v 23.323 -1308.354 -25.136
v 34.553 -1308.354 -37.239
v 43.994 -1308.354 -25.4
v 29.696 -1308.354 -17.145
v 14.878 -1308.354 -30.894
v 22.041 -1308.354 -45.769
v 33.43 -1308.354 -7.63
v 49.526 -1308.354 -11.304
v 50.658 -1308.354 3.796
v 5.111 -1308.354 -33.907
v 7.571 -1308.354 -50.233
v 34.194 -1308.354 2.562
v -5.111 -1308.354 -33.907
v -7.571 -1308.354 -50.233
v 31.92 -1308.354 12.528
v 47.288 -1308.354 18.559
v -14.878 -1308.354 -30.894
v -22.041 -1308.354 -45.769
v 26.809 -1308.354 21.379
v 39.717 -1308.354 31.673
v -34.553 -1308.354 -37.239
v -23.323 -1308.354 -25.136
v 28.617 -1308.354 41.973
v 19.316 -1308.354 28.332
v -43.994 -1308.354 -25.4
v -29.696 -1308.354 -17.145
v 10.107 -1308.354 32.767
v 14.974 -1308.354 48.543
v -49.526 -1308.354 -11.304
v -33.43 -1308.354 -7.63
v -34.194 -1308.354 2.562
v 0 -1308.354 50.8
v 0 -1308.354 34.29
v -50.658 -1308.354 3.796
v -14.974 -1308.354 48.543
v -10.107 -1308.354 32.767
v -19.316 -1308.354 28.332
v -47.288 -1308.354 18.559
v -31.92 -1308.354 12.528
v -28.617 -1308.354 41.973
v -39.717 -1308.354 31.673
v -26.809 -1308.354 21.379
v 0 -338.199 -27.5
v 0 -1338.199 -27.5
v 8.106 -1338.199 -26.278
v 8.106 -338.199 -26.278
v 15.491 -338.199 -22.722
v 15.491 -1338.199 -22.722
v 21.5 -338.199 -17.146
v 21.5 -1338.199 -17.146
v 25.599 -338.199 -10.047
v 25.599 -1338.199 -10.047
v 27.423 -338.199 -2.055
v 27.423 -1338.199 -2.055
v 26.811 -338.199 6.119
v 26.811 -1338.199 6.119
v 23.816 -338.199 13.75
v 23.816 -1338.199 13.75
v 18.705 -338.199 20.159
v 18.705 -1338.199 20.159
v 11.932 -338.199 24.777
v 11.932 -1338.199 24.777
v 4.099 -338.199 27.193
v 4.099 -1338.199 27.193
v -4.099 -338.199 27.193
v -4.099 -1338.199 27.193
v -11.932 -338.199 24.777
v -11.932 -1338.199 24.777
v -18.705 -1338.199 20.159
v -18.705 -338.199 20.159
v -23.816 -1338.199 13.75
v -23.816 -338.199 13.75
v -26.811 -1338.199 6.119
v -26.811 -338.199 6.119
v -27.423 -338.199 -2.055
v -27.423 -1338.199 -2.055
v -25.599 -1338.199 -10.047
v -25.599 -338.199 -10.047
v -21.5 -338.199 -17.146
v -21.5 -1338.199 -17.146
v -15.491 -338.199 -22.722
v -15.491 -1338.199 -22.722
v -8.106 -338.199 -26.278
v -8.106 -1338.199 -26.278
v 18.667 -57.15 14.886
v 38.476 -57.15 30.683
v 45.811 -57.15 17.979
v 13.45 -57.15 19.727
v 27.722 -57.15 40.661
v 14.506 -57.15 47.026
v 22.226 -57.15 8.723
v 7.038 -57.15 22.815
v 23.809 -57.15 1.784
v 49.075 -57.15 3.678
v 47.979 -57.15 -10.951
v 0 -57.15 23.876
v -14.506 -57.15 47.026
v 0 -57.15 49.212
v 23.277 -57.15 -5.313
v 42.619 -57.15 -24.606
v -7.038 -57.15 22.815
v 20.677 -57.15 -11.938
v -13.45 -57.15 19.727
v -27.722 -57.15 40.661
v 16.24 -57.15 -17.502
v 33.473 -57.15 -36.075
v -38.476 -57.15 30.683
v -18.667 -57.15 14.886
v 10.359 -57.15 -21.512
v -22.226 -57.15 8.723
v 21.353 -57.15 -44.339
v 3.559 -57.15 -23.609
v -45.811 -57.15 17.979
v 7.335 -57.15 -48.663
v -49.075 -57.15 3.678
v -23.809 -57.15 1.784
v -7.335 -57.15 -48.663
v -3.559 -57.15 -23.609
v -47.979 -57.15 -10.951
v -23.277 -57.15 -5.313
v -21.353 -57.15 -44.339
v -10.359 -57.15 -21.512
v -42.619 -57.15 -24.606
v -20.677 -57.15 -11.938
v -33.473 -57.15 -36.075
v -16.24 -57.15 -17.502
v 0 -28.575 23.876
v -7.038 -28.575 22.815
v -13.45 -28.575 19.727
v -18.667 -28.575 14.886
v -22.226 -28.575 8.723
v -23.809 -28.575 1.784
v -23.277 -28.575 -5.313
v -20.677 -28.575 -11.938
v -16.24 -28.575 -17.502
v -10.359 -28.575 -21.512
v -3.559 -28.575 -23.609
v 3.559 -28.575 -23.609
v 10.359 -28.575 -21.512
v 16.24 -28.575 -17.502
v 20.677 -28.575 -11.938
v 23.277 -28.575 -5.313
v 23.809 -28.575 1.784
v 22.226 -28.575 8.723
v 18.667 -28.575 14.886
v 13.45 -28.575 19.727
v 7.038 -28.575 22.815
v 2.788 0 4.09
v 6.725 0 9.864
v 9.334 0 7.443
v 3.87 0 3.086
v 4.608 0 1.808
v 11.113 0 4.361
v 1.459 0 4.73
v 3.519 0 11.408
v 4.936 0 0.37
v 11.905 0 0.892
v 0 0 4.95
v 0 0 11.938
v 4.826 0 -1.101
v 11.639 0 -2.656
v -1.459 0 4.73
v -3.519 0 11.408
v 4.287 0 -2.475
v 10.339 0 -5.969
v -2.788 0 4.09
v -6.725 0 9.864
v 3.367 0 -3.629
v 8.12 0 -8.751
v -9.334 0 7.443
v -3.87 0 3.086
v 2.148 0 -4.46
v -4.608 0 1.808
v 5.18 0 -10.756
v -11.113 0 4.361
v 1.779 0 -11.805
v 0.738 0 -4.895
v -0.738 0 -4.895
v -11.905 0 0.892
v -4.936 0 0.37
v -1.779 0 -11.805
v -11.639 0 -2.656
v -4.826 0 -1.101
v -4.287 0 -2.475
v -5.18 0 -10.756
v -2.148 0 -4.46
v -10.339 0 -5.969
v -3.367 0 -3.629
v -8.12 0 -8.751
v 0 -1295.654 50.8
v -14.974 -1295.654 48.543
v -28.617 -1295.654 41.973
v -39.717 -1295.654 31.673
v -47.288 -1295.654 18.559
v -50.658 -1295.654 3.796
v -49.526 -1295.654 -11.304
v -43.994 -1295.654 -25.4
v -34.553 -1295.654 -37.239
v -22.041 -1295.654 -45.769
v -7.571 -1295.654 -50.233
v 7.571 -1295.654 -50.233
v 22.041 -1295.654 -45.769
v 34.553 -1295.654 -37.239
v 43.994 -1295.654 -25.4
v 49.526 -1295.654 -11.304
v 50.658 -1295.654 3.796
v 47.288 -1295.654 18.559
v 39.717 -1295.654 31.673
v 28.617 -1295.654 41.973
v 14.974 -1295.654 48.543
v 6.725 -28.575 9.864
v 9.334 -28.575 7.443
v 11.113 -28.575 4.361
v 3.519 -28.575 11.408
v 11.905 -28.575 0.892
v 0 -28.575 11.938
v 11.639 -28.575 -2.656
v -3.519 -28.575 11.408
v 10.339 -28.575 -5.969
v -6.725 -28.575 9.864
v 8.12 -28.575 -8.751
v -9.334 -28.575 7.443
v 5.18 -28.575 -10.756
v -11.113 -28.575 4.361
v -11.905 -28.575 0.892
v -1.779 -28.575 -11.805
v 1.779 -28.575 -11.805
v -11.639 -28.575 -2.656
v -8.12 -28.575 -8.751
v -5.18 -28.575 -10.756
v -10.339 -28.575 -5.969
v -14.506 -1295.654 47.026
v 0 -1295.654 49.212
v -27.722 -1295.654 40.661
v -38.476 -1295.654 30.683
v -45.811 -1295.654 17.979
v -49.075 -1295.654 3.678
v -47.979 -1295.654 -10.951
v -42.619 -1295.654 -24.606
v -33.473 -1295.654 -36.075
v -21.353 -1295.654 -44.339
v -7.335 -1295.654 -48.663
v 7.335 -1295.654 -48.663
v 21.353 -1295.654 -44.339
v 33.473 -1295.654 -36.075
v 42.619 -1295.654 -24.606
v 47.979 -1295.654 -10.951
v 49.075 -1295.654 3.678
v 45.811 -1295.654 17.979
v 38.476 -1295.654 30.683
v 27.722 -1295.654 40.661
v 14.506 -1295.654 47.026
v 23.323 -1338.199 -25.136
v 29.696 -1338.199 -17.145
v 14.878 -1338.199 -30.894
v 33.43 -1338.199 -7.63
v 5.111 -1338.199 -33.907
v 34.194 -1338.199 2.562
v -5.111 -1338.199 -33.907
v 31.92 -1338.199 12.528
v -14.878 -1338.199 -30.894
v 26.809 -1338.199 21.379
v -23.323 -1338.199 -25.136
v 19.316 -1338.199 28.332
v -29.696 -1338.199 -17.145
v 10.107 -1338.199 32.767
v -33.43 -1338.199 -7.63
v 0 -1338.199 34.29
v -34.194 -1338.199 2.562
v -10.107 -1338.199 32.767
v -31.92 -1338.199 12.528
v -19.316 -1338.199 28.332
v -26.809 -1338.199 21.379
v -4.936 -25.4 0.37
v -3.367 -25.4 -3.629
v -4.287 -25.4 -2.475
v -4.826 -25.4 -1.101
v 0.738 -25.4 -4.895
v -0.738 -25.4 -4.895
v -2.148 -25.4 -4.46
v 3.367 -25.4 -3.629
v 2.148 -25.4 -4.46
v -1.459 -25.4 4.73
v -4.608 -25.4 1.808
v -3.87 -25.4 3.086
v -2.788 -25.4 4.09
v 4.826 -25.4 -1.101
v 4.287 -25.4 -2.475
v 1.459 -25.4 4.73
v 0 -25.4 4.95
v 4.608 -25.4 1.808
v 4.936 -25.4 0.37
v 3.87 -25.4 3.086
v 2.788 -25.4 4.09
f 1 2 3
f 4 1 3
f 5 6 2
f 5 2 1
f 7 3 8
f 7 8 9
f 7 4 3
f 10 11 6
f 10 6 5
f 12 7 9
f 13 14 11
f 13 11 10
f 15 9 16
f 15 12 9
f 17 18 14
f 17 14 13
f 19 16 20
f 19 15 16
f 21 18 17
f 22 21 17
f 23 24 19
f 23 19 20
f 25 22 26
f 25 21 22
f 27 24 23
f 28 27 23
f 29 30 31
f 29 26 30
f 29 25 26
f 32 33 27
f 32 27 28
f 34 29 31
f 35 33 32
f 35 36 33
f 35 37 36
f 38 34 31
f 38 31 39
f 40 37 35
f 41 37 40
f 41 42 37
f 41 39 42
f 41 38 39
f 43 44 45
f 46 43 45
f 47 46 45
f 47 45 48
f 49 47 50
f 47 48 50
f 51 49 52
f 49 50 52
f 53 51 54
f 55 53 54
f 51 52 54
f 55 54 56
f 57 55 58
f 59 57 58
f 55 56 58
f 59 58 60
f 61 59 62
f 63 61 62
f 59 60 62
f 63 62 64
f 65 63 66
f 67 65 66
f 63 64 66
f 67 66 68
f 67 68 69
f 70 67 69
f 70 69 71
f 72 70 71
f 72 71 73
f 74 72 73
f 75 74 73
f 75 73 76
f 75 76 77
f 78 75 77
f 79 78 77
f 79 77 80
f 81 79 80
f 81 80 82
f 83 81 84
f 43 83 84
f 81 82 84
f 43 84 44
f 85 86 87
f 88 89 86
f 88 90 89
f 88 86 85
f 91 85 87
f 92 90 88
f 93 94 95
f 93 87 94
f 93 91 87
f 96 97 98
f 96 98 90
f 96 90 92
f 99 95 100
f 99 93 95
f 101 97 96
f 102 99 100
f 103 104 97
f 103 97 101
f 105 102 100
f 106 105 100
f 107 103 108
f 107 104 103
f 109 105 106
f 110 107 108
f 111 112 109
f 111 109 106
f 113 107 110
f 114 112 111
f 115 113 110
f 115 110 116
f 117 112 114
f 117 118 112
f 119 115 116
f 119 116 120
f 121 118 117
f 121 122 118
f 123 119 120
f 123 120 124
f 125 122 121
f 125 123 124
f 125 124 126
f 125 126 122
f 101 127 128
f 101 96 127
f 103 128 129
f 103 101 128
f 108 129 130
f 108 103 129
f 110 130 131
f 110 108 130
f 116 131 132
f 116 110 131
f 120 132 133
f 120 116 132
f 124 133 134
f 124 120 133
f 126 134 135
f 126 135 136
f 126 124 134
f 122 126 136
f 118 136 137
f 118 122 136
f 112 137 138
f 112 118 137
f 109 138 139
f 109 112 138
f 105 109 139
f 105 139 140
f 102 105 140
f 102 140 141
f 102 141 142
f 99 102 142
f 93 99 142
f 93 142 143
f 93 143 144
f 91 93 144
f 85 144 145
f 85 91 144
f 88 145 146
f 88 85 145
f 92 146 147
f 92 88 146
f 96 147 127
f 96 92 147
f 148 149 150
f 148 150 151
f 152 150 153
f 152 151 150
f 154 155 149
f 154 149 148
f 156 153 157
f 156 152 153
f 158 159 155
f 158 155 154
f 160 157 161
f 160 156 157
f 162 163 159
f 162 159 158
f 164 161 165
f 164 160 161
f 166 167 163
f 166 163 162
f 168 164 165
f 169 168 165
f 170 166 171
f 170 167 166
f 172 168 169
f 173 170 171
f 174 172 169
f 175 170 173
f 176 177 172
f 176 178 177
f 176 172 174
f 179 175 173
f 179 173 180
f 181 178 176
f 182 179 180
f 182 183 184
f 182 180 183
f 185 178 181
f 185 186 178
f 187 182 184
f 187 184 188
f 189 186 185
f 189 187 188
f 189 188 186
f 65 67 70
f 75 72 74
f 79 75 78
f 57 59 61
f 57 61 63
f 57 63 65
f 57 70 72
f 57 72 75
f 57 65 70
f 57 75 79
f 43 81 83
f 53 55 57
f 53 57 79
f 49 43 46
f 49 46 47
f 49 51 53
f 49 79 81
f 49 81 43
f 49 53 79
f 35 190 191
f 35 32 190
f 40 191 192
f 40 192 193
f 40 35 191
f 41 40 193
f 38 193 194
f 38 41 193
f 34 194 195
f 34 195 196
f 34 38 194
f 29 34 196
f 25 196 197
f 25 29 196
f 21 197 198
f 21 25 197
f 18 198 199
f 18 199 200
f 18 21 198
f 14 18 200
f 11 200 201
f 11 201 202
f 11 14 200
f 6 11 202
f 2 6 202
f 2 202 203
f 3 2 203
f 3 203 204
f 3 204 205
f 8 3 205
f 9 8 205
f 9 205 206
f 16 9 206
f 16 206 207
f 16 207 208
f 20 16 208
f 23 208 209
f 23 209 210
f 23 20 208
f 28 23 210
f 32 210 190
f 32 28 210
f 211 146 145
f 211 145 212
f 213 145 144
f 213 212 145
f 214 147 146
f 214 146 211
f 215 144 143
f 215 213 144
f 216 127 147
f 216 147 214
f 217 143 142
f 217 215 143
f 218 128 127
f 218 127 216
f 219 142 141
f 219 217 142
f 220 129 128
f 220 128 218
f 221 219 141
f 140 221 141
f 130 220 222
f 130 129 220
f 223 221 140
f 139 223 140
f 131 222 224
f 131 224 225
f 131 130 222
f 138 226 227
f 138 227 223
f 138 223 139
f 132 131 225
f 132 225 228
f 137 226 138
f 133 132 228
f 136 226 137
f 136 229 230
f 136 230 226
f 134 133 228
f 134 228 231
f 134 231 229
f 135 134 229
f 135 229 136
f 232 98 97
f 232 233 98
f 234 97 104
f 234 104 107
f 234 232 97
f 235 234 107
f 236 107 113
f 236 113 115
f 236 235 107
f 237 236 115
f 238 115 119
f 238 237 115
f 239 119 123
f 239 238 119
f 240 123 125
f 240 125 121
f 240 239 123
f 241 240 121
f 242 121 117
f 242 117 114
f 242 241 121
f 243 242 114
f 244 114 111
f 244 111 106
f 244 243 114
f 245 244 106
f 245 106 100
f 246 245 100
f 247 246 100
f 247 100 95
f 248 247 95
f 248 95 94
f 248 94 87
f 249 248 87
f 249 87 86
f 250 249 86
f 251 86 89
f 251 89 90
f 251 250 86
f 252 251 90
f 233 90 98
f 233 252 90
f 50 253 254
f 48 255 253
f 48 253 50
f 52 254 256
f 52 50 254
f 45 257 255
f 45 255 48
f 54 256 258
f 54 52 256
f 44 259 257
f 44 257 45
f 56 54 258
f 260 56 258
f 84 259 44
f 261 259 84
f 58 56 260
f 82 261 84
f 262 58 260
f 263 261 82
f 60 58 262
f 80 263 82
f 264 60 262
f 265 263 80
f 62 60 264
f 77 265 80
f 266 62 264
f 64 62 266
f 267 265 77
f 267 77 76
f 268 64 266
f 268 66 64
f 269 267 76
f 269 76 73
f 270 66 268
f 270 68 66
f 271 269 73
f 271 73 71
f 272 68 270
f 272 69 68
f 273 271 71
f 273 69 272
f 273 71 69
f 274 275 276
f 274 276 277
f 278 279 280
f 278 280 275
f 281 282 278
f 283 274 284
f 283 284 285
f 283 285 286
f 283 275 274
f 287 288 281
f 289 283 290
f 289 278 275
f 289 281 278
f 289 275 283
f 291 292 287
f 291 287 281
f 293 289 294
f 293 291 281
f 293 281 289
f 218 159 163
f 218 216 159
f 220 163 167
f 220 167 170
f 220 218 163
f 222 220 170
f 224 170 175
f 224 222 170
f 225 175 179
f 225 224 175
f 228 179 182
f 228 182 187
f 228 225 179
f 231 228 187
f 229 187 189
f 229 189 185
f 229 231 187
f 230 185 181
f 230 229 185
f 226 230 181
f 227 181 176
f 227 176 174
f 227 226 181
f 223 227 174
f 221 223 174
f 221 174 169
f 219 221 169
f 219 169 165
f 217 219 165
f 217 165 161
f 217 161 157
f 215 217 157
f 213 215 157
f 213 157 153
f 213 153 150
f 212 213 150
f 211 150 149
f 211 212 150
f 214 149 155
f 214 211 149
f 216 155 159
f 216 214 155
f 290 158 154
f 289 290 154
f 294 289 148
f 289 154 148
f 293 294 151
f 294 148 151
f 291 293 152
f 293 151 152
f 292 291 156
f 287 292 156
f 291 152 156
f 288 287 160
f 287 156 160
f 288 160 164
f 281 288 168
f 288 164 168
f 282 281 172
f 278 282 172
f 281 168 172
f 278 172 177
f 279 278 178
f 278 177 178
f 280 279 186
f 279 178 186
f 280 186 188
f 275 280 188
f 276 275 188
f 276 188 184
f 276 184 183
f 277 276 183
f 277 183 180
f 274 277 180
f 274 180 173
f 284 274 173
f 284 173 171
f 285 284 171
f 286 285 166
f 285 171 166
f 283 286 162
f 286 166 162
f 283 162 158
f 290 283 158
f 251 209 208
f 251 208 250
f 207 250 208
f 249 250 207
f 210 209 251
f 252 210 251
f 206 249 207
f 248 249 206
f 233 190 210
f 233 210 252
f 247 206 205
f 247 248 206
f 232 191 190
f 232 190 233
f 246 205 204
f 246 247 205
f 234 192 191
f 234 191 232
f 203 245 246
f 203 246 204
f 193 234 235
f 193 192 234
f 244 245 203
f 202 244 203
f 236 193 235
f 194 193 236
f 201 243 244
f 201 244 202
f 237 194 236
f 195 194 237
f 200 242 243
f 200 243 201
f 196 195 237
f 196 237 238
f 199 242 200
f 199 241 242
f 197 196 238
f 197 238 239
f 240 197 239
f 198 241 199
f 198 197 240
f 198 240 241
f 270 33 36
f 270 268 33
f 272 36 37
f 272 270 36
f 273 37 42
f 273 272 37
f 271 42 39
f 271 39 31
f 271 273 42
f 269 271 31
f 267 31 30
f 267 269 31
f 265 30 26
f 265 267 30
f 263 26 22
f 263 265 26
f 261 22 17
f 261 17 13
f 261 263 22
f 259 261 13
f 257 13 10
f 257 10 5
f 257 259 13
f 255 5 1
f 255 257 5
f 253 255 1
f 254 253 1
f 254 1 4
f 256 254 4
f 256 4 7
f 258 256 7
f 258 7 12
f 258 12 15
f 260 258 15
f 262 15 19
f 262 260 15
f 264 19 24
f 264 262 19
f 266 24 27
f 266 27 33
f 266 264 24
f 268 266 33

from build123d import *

# Parameters (mm, degrees)
SKETCH2_R          = 4.95
CUT_EXTRUDE1_DEPTH = 25.4
SKETCH5_R          = 27.5
CUT_EXTRUDE3_DEPTH = 1000


with BuildPart() as part:
    # Sketch1 → Revolve1 (revolve)
    with BuildSketch(Plane(origin=(0, 0, 0), x_dir=(0, 0, -1), z_dir=(1, 0, 0))):
        Polygon((0, 0), (-11.938, 0), (-11.938, -28.575), (-23.876, -28.575), (-23.876, -57.15), (-49.2125, -57.15), (-49.2125, -1295.654), (-50.8, -1295.654), (-50.8, -1308.354), (-34.29, -1308.354), (-34.29, -1338.199), (0, -1338.199), align=None)
    revolve(axis=Axis((0, 0, 0), (0, -1, 0)))

    # Sketch2 → Cut-Extrude1 (cut)
    with BuildSketch(Plane(origin=(0, 0, 0), x_dir=(1, 0, 0), z_dir=(0, 1, 0))):
        with Locations(Location((0, 0, 0), (0, 0, 270))):
            Circle(SKETCH2_R)
    extrude(amount=-CUT_EXTRUDE1_DEPTH, mode=Mode.SUBTRACT)

    # Sketch5 → Cut-Extrude3 (cut)
    with BuildSketch(Plane.XZ.offset(1338.199)):
        with Locations(Location((0, 0, 0), (0, 0, 270))):
            Circle(SKETCH5_R)
    extrude(amount=-CUT_EXTRUDE3_DEPTH, mode=Mode.SUBTRACT)


solid = part.part
